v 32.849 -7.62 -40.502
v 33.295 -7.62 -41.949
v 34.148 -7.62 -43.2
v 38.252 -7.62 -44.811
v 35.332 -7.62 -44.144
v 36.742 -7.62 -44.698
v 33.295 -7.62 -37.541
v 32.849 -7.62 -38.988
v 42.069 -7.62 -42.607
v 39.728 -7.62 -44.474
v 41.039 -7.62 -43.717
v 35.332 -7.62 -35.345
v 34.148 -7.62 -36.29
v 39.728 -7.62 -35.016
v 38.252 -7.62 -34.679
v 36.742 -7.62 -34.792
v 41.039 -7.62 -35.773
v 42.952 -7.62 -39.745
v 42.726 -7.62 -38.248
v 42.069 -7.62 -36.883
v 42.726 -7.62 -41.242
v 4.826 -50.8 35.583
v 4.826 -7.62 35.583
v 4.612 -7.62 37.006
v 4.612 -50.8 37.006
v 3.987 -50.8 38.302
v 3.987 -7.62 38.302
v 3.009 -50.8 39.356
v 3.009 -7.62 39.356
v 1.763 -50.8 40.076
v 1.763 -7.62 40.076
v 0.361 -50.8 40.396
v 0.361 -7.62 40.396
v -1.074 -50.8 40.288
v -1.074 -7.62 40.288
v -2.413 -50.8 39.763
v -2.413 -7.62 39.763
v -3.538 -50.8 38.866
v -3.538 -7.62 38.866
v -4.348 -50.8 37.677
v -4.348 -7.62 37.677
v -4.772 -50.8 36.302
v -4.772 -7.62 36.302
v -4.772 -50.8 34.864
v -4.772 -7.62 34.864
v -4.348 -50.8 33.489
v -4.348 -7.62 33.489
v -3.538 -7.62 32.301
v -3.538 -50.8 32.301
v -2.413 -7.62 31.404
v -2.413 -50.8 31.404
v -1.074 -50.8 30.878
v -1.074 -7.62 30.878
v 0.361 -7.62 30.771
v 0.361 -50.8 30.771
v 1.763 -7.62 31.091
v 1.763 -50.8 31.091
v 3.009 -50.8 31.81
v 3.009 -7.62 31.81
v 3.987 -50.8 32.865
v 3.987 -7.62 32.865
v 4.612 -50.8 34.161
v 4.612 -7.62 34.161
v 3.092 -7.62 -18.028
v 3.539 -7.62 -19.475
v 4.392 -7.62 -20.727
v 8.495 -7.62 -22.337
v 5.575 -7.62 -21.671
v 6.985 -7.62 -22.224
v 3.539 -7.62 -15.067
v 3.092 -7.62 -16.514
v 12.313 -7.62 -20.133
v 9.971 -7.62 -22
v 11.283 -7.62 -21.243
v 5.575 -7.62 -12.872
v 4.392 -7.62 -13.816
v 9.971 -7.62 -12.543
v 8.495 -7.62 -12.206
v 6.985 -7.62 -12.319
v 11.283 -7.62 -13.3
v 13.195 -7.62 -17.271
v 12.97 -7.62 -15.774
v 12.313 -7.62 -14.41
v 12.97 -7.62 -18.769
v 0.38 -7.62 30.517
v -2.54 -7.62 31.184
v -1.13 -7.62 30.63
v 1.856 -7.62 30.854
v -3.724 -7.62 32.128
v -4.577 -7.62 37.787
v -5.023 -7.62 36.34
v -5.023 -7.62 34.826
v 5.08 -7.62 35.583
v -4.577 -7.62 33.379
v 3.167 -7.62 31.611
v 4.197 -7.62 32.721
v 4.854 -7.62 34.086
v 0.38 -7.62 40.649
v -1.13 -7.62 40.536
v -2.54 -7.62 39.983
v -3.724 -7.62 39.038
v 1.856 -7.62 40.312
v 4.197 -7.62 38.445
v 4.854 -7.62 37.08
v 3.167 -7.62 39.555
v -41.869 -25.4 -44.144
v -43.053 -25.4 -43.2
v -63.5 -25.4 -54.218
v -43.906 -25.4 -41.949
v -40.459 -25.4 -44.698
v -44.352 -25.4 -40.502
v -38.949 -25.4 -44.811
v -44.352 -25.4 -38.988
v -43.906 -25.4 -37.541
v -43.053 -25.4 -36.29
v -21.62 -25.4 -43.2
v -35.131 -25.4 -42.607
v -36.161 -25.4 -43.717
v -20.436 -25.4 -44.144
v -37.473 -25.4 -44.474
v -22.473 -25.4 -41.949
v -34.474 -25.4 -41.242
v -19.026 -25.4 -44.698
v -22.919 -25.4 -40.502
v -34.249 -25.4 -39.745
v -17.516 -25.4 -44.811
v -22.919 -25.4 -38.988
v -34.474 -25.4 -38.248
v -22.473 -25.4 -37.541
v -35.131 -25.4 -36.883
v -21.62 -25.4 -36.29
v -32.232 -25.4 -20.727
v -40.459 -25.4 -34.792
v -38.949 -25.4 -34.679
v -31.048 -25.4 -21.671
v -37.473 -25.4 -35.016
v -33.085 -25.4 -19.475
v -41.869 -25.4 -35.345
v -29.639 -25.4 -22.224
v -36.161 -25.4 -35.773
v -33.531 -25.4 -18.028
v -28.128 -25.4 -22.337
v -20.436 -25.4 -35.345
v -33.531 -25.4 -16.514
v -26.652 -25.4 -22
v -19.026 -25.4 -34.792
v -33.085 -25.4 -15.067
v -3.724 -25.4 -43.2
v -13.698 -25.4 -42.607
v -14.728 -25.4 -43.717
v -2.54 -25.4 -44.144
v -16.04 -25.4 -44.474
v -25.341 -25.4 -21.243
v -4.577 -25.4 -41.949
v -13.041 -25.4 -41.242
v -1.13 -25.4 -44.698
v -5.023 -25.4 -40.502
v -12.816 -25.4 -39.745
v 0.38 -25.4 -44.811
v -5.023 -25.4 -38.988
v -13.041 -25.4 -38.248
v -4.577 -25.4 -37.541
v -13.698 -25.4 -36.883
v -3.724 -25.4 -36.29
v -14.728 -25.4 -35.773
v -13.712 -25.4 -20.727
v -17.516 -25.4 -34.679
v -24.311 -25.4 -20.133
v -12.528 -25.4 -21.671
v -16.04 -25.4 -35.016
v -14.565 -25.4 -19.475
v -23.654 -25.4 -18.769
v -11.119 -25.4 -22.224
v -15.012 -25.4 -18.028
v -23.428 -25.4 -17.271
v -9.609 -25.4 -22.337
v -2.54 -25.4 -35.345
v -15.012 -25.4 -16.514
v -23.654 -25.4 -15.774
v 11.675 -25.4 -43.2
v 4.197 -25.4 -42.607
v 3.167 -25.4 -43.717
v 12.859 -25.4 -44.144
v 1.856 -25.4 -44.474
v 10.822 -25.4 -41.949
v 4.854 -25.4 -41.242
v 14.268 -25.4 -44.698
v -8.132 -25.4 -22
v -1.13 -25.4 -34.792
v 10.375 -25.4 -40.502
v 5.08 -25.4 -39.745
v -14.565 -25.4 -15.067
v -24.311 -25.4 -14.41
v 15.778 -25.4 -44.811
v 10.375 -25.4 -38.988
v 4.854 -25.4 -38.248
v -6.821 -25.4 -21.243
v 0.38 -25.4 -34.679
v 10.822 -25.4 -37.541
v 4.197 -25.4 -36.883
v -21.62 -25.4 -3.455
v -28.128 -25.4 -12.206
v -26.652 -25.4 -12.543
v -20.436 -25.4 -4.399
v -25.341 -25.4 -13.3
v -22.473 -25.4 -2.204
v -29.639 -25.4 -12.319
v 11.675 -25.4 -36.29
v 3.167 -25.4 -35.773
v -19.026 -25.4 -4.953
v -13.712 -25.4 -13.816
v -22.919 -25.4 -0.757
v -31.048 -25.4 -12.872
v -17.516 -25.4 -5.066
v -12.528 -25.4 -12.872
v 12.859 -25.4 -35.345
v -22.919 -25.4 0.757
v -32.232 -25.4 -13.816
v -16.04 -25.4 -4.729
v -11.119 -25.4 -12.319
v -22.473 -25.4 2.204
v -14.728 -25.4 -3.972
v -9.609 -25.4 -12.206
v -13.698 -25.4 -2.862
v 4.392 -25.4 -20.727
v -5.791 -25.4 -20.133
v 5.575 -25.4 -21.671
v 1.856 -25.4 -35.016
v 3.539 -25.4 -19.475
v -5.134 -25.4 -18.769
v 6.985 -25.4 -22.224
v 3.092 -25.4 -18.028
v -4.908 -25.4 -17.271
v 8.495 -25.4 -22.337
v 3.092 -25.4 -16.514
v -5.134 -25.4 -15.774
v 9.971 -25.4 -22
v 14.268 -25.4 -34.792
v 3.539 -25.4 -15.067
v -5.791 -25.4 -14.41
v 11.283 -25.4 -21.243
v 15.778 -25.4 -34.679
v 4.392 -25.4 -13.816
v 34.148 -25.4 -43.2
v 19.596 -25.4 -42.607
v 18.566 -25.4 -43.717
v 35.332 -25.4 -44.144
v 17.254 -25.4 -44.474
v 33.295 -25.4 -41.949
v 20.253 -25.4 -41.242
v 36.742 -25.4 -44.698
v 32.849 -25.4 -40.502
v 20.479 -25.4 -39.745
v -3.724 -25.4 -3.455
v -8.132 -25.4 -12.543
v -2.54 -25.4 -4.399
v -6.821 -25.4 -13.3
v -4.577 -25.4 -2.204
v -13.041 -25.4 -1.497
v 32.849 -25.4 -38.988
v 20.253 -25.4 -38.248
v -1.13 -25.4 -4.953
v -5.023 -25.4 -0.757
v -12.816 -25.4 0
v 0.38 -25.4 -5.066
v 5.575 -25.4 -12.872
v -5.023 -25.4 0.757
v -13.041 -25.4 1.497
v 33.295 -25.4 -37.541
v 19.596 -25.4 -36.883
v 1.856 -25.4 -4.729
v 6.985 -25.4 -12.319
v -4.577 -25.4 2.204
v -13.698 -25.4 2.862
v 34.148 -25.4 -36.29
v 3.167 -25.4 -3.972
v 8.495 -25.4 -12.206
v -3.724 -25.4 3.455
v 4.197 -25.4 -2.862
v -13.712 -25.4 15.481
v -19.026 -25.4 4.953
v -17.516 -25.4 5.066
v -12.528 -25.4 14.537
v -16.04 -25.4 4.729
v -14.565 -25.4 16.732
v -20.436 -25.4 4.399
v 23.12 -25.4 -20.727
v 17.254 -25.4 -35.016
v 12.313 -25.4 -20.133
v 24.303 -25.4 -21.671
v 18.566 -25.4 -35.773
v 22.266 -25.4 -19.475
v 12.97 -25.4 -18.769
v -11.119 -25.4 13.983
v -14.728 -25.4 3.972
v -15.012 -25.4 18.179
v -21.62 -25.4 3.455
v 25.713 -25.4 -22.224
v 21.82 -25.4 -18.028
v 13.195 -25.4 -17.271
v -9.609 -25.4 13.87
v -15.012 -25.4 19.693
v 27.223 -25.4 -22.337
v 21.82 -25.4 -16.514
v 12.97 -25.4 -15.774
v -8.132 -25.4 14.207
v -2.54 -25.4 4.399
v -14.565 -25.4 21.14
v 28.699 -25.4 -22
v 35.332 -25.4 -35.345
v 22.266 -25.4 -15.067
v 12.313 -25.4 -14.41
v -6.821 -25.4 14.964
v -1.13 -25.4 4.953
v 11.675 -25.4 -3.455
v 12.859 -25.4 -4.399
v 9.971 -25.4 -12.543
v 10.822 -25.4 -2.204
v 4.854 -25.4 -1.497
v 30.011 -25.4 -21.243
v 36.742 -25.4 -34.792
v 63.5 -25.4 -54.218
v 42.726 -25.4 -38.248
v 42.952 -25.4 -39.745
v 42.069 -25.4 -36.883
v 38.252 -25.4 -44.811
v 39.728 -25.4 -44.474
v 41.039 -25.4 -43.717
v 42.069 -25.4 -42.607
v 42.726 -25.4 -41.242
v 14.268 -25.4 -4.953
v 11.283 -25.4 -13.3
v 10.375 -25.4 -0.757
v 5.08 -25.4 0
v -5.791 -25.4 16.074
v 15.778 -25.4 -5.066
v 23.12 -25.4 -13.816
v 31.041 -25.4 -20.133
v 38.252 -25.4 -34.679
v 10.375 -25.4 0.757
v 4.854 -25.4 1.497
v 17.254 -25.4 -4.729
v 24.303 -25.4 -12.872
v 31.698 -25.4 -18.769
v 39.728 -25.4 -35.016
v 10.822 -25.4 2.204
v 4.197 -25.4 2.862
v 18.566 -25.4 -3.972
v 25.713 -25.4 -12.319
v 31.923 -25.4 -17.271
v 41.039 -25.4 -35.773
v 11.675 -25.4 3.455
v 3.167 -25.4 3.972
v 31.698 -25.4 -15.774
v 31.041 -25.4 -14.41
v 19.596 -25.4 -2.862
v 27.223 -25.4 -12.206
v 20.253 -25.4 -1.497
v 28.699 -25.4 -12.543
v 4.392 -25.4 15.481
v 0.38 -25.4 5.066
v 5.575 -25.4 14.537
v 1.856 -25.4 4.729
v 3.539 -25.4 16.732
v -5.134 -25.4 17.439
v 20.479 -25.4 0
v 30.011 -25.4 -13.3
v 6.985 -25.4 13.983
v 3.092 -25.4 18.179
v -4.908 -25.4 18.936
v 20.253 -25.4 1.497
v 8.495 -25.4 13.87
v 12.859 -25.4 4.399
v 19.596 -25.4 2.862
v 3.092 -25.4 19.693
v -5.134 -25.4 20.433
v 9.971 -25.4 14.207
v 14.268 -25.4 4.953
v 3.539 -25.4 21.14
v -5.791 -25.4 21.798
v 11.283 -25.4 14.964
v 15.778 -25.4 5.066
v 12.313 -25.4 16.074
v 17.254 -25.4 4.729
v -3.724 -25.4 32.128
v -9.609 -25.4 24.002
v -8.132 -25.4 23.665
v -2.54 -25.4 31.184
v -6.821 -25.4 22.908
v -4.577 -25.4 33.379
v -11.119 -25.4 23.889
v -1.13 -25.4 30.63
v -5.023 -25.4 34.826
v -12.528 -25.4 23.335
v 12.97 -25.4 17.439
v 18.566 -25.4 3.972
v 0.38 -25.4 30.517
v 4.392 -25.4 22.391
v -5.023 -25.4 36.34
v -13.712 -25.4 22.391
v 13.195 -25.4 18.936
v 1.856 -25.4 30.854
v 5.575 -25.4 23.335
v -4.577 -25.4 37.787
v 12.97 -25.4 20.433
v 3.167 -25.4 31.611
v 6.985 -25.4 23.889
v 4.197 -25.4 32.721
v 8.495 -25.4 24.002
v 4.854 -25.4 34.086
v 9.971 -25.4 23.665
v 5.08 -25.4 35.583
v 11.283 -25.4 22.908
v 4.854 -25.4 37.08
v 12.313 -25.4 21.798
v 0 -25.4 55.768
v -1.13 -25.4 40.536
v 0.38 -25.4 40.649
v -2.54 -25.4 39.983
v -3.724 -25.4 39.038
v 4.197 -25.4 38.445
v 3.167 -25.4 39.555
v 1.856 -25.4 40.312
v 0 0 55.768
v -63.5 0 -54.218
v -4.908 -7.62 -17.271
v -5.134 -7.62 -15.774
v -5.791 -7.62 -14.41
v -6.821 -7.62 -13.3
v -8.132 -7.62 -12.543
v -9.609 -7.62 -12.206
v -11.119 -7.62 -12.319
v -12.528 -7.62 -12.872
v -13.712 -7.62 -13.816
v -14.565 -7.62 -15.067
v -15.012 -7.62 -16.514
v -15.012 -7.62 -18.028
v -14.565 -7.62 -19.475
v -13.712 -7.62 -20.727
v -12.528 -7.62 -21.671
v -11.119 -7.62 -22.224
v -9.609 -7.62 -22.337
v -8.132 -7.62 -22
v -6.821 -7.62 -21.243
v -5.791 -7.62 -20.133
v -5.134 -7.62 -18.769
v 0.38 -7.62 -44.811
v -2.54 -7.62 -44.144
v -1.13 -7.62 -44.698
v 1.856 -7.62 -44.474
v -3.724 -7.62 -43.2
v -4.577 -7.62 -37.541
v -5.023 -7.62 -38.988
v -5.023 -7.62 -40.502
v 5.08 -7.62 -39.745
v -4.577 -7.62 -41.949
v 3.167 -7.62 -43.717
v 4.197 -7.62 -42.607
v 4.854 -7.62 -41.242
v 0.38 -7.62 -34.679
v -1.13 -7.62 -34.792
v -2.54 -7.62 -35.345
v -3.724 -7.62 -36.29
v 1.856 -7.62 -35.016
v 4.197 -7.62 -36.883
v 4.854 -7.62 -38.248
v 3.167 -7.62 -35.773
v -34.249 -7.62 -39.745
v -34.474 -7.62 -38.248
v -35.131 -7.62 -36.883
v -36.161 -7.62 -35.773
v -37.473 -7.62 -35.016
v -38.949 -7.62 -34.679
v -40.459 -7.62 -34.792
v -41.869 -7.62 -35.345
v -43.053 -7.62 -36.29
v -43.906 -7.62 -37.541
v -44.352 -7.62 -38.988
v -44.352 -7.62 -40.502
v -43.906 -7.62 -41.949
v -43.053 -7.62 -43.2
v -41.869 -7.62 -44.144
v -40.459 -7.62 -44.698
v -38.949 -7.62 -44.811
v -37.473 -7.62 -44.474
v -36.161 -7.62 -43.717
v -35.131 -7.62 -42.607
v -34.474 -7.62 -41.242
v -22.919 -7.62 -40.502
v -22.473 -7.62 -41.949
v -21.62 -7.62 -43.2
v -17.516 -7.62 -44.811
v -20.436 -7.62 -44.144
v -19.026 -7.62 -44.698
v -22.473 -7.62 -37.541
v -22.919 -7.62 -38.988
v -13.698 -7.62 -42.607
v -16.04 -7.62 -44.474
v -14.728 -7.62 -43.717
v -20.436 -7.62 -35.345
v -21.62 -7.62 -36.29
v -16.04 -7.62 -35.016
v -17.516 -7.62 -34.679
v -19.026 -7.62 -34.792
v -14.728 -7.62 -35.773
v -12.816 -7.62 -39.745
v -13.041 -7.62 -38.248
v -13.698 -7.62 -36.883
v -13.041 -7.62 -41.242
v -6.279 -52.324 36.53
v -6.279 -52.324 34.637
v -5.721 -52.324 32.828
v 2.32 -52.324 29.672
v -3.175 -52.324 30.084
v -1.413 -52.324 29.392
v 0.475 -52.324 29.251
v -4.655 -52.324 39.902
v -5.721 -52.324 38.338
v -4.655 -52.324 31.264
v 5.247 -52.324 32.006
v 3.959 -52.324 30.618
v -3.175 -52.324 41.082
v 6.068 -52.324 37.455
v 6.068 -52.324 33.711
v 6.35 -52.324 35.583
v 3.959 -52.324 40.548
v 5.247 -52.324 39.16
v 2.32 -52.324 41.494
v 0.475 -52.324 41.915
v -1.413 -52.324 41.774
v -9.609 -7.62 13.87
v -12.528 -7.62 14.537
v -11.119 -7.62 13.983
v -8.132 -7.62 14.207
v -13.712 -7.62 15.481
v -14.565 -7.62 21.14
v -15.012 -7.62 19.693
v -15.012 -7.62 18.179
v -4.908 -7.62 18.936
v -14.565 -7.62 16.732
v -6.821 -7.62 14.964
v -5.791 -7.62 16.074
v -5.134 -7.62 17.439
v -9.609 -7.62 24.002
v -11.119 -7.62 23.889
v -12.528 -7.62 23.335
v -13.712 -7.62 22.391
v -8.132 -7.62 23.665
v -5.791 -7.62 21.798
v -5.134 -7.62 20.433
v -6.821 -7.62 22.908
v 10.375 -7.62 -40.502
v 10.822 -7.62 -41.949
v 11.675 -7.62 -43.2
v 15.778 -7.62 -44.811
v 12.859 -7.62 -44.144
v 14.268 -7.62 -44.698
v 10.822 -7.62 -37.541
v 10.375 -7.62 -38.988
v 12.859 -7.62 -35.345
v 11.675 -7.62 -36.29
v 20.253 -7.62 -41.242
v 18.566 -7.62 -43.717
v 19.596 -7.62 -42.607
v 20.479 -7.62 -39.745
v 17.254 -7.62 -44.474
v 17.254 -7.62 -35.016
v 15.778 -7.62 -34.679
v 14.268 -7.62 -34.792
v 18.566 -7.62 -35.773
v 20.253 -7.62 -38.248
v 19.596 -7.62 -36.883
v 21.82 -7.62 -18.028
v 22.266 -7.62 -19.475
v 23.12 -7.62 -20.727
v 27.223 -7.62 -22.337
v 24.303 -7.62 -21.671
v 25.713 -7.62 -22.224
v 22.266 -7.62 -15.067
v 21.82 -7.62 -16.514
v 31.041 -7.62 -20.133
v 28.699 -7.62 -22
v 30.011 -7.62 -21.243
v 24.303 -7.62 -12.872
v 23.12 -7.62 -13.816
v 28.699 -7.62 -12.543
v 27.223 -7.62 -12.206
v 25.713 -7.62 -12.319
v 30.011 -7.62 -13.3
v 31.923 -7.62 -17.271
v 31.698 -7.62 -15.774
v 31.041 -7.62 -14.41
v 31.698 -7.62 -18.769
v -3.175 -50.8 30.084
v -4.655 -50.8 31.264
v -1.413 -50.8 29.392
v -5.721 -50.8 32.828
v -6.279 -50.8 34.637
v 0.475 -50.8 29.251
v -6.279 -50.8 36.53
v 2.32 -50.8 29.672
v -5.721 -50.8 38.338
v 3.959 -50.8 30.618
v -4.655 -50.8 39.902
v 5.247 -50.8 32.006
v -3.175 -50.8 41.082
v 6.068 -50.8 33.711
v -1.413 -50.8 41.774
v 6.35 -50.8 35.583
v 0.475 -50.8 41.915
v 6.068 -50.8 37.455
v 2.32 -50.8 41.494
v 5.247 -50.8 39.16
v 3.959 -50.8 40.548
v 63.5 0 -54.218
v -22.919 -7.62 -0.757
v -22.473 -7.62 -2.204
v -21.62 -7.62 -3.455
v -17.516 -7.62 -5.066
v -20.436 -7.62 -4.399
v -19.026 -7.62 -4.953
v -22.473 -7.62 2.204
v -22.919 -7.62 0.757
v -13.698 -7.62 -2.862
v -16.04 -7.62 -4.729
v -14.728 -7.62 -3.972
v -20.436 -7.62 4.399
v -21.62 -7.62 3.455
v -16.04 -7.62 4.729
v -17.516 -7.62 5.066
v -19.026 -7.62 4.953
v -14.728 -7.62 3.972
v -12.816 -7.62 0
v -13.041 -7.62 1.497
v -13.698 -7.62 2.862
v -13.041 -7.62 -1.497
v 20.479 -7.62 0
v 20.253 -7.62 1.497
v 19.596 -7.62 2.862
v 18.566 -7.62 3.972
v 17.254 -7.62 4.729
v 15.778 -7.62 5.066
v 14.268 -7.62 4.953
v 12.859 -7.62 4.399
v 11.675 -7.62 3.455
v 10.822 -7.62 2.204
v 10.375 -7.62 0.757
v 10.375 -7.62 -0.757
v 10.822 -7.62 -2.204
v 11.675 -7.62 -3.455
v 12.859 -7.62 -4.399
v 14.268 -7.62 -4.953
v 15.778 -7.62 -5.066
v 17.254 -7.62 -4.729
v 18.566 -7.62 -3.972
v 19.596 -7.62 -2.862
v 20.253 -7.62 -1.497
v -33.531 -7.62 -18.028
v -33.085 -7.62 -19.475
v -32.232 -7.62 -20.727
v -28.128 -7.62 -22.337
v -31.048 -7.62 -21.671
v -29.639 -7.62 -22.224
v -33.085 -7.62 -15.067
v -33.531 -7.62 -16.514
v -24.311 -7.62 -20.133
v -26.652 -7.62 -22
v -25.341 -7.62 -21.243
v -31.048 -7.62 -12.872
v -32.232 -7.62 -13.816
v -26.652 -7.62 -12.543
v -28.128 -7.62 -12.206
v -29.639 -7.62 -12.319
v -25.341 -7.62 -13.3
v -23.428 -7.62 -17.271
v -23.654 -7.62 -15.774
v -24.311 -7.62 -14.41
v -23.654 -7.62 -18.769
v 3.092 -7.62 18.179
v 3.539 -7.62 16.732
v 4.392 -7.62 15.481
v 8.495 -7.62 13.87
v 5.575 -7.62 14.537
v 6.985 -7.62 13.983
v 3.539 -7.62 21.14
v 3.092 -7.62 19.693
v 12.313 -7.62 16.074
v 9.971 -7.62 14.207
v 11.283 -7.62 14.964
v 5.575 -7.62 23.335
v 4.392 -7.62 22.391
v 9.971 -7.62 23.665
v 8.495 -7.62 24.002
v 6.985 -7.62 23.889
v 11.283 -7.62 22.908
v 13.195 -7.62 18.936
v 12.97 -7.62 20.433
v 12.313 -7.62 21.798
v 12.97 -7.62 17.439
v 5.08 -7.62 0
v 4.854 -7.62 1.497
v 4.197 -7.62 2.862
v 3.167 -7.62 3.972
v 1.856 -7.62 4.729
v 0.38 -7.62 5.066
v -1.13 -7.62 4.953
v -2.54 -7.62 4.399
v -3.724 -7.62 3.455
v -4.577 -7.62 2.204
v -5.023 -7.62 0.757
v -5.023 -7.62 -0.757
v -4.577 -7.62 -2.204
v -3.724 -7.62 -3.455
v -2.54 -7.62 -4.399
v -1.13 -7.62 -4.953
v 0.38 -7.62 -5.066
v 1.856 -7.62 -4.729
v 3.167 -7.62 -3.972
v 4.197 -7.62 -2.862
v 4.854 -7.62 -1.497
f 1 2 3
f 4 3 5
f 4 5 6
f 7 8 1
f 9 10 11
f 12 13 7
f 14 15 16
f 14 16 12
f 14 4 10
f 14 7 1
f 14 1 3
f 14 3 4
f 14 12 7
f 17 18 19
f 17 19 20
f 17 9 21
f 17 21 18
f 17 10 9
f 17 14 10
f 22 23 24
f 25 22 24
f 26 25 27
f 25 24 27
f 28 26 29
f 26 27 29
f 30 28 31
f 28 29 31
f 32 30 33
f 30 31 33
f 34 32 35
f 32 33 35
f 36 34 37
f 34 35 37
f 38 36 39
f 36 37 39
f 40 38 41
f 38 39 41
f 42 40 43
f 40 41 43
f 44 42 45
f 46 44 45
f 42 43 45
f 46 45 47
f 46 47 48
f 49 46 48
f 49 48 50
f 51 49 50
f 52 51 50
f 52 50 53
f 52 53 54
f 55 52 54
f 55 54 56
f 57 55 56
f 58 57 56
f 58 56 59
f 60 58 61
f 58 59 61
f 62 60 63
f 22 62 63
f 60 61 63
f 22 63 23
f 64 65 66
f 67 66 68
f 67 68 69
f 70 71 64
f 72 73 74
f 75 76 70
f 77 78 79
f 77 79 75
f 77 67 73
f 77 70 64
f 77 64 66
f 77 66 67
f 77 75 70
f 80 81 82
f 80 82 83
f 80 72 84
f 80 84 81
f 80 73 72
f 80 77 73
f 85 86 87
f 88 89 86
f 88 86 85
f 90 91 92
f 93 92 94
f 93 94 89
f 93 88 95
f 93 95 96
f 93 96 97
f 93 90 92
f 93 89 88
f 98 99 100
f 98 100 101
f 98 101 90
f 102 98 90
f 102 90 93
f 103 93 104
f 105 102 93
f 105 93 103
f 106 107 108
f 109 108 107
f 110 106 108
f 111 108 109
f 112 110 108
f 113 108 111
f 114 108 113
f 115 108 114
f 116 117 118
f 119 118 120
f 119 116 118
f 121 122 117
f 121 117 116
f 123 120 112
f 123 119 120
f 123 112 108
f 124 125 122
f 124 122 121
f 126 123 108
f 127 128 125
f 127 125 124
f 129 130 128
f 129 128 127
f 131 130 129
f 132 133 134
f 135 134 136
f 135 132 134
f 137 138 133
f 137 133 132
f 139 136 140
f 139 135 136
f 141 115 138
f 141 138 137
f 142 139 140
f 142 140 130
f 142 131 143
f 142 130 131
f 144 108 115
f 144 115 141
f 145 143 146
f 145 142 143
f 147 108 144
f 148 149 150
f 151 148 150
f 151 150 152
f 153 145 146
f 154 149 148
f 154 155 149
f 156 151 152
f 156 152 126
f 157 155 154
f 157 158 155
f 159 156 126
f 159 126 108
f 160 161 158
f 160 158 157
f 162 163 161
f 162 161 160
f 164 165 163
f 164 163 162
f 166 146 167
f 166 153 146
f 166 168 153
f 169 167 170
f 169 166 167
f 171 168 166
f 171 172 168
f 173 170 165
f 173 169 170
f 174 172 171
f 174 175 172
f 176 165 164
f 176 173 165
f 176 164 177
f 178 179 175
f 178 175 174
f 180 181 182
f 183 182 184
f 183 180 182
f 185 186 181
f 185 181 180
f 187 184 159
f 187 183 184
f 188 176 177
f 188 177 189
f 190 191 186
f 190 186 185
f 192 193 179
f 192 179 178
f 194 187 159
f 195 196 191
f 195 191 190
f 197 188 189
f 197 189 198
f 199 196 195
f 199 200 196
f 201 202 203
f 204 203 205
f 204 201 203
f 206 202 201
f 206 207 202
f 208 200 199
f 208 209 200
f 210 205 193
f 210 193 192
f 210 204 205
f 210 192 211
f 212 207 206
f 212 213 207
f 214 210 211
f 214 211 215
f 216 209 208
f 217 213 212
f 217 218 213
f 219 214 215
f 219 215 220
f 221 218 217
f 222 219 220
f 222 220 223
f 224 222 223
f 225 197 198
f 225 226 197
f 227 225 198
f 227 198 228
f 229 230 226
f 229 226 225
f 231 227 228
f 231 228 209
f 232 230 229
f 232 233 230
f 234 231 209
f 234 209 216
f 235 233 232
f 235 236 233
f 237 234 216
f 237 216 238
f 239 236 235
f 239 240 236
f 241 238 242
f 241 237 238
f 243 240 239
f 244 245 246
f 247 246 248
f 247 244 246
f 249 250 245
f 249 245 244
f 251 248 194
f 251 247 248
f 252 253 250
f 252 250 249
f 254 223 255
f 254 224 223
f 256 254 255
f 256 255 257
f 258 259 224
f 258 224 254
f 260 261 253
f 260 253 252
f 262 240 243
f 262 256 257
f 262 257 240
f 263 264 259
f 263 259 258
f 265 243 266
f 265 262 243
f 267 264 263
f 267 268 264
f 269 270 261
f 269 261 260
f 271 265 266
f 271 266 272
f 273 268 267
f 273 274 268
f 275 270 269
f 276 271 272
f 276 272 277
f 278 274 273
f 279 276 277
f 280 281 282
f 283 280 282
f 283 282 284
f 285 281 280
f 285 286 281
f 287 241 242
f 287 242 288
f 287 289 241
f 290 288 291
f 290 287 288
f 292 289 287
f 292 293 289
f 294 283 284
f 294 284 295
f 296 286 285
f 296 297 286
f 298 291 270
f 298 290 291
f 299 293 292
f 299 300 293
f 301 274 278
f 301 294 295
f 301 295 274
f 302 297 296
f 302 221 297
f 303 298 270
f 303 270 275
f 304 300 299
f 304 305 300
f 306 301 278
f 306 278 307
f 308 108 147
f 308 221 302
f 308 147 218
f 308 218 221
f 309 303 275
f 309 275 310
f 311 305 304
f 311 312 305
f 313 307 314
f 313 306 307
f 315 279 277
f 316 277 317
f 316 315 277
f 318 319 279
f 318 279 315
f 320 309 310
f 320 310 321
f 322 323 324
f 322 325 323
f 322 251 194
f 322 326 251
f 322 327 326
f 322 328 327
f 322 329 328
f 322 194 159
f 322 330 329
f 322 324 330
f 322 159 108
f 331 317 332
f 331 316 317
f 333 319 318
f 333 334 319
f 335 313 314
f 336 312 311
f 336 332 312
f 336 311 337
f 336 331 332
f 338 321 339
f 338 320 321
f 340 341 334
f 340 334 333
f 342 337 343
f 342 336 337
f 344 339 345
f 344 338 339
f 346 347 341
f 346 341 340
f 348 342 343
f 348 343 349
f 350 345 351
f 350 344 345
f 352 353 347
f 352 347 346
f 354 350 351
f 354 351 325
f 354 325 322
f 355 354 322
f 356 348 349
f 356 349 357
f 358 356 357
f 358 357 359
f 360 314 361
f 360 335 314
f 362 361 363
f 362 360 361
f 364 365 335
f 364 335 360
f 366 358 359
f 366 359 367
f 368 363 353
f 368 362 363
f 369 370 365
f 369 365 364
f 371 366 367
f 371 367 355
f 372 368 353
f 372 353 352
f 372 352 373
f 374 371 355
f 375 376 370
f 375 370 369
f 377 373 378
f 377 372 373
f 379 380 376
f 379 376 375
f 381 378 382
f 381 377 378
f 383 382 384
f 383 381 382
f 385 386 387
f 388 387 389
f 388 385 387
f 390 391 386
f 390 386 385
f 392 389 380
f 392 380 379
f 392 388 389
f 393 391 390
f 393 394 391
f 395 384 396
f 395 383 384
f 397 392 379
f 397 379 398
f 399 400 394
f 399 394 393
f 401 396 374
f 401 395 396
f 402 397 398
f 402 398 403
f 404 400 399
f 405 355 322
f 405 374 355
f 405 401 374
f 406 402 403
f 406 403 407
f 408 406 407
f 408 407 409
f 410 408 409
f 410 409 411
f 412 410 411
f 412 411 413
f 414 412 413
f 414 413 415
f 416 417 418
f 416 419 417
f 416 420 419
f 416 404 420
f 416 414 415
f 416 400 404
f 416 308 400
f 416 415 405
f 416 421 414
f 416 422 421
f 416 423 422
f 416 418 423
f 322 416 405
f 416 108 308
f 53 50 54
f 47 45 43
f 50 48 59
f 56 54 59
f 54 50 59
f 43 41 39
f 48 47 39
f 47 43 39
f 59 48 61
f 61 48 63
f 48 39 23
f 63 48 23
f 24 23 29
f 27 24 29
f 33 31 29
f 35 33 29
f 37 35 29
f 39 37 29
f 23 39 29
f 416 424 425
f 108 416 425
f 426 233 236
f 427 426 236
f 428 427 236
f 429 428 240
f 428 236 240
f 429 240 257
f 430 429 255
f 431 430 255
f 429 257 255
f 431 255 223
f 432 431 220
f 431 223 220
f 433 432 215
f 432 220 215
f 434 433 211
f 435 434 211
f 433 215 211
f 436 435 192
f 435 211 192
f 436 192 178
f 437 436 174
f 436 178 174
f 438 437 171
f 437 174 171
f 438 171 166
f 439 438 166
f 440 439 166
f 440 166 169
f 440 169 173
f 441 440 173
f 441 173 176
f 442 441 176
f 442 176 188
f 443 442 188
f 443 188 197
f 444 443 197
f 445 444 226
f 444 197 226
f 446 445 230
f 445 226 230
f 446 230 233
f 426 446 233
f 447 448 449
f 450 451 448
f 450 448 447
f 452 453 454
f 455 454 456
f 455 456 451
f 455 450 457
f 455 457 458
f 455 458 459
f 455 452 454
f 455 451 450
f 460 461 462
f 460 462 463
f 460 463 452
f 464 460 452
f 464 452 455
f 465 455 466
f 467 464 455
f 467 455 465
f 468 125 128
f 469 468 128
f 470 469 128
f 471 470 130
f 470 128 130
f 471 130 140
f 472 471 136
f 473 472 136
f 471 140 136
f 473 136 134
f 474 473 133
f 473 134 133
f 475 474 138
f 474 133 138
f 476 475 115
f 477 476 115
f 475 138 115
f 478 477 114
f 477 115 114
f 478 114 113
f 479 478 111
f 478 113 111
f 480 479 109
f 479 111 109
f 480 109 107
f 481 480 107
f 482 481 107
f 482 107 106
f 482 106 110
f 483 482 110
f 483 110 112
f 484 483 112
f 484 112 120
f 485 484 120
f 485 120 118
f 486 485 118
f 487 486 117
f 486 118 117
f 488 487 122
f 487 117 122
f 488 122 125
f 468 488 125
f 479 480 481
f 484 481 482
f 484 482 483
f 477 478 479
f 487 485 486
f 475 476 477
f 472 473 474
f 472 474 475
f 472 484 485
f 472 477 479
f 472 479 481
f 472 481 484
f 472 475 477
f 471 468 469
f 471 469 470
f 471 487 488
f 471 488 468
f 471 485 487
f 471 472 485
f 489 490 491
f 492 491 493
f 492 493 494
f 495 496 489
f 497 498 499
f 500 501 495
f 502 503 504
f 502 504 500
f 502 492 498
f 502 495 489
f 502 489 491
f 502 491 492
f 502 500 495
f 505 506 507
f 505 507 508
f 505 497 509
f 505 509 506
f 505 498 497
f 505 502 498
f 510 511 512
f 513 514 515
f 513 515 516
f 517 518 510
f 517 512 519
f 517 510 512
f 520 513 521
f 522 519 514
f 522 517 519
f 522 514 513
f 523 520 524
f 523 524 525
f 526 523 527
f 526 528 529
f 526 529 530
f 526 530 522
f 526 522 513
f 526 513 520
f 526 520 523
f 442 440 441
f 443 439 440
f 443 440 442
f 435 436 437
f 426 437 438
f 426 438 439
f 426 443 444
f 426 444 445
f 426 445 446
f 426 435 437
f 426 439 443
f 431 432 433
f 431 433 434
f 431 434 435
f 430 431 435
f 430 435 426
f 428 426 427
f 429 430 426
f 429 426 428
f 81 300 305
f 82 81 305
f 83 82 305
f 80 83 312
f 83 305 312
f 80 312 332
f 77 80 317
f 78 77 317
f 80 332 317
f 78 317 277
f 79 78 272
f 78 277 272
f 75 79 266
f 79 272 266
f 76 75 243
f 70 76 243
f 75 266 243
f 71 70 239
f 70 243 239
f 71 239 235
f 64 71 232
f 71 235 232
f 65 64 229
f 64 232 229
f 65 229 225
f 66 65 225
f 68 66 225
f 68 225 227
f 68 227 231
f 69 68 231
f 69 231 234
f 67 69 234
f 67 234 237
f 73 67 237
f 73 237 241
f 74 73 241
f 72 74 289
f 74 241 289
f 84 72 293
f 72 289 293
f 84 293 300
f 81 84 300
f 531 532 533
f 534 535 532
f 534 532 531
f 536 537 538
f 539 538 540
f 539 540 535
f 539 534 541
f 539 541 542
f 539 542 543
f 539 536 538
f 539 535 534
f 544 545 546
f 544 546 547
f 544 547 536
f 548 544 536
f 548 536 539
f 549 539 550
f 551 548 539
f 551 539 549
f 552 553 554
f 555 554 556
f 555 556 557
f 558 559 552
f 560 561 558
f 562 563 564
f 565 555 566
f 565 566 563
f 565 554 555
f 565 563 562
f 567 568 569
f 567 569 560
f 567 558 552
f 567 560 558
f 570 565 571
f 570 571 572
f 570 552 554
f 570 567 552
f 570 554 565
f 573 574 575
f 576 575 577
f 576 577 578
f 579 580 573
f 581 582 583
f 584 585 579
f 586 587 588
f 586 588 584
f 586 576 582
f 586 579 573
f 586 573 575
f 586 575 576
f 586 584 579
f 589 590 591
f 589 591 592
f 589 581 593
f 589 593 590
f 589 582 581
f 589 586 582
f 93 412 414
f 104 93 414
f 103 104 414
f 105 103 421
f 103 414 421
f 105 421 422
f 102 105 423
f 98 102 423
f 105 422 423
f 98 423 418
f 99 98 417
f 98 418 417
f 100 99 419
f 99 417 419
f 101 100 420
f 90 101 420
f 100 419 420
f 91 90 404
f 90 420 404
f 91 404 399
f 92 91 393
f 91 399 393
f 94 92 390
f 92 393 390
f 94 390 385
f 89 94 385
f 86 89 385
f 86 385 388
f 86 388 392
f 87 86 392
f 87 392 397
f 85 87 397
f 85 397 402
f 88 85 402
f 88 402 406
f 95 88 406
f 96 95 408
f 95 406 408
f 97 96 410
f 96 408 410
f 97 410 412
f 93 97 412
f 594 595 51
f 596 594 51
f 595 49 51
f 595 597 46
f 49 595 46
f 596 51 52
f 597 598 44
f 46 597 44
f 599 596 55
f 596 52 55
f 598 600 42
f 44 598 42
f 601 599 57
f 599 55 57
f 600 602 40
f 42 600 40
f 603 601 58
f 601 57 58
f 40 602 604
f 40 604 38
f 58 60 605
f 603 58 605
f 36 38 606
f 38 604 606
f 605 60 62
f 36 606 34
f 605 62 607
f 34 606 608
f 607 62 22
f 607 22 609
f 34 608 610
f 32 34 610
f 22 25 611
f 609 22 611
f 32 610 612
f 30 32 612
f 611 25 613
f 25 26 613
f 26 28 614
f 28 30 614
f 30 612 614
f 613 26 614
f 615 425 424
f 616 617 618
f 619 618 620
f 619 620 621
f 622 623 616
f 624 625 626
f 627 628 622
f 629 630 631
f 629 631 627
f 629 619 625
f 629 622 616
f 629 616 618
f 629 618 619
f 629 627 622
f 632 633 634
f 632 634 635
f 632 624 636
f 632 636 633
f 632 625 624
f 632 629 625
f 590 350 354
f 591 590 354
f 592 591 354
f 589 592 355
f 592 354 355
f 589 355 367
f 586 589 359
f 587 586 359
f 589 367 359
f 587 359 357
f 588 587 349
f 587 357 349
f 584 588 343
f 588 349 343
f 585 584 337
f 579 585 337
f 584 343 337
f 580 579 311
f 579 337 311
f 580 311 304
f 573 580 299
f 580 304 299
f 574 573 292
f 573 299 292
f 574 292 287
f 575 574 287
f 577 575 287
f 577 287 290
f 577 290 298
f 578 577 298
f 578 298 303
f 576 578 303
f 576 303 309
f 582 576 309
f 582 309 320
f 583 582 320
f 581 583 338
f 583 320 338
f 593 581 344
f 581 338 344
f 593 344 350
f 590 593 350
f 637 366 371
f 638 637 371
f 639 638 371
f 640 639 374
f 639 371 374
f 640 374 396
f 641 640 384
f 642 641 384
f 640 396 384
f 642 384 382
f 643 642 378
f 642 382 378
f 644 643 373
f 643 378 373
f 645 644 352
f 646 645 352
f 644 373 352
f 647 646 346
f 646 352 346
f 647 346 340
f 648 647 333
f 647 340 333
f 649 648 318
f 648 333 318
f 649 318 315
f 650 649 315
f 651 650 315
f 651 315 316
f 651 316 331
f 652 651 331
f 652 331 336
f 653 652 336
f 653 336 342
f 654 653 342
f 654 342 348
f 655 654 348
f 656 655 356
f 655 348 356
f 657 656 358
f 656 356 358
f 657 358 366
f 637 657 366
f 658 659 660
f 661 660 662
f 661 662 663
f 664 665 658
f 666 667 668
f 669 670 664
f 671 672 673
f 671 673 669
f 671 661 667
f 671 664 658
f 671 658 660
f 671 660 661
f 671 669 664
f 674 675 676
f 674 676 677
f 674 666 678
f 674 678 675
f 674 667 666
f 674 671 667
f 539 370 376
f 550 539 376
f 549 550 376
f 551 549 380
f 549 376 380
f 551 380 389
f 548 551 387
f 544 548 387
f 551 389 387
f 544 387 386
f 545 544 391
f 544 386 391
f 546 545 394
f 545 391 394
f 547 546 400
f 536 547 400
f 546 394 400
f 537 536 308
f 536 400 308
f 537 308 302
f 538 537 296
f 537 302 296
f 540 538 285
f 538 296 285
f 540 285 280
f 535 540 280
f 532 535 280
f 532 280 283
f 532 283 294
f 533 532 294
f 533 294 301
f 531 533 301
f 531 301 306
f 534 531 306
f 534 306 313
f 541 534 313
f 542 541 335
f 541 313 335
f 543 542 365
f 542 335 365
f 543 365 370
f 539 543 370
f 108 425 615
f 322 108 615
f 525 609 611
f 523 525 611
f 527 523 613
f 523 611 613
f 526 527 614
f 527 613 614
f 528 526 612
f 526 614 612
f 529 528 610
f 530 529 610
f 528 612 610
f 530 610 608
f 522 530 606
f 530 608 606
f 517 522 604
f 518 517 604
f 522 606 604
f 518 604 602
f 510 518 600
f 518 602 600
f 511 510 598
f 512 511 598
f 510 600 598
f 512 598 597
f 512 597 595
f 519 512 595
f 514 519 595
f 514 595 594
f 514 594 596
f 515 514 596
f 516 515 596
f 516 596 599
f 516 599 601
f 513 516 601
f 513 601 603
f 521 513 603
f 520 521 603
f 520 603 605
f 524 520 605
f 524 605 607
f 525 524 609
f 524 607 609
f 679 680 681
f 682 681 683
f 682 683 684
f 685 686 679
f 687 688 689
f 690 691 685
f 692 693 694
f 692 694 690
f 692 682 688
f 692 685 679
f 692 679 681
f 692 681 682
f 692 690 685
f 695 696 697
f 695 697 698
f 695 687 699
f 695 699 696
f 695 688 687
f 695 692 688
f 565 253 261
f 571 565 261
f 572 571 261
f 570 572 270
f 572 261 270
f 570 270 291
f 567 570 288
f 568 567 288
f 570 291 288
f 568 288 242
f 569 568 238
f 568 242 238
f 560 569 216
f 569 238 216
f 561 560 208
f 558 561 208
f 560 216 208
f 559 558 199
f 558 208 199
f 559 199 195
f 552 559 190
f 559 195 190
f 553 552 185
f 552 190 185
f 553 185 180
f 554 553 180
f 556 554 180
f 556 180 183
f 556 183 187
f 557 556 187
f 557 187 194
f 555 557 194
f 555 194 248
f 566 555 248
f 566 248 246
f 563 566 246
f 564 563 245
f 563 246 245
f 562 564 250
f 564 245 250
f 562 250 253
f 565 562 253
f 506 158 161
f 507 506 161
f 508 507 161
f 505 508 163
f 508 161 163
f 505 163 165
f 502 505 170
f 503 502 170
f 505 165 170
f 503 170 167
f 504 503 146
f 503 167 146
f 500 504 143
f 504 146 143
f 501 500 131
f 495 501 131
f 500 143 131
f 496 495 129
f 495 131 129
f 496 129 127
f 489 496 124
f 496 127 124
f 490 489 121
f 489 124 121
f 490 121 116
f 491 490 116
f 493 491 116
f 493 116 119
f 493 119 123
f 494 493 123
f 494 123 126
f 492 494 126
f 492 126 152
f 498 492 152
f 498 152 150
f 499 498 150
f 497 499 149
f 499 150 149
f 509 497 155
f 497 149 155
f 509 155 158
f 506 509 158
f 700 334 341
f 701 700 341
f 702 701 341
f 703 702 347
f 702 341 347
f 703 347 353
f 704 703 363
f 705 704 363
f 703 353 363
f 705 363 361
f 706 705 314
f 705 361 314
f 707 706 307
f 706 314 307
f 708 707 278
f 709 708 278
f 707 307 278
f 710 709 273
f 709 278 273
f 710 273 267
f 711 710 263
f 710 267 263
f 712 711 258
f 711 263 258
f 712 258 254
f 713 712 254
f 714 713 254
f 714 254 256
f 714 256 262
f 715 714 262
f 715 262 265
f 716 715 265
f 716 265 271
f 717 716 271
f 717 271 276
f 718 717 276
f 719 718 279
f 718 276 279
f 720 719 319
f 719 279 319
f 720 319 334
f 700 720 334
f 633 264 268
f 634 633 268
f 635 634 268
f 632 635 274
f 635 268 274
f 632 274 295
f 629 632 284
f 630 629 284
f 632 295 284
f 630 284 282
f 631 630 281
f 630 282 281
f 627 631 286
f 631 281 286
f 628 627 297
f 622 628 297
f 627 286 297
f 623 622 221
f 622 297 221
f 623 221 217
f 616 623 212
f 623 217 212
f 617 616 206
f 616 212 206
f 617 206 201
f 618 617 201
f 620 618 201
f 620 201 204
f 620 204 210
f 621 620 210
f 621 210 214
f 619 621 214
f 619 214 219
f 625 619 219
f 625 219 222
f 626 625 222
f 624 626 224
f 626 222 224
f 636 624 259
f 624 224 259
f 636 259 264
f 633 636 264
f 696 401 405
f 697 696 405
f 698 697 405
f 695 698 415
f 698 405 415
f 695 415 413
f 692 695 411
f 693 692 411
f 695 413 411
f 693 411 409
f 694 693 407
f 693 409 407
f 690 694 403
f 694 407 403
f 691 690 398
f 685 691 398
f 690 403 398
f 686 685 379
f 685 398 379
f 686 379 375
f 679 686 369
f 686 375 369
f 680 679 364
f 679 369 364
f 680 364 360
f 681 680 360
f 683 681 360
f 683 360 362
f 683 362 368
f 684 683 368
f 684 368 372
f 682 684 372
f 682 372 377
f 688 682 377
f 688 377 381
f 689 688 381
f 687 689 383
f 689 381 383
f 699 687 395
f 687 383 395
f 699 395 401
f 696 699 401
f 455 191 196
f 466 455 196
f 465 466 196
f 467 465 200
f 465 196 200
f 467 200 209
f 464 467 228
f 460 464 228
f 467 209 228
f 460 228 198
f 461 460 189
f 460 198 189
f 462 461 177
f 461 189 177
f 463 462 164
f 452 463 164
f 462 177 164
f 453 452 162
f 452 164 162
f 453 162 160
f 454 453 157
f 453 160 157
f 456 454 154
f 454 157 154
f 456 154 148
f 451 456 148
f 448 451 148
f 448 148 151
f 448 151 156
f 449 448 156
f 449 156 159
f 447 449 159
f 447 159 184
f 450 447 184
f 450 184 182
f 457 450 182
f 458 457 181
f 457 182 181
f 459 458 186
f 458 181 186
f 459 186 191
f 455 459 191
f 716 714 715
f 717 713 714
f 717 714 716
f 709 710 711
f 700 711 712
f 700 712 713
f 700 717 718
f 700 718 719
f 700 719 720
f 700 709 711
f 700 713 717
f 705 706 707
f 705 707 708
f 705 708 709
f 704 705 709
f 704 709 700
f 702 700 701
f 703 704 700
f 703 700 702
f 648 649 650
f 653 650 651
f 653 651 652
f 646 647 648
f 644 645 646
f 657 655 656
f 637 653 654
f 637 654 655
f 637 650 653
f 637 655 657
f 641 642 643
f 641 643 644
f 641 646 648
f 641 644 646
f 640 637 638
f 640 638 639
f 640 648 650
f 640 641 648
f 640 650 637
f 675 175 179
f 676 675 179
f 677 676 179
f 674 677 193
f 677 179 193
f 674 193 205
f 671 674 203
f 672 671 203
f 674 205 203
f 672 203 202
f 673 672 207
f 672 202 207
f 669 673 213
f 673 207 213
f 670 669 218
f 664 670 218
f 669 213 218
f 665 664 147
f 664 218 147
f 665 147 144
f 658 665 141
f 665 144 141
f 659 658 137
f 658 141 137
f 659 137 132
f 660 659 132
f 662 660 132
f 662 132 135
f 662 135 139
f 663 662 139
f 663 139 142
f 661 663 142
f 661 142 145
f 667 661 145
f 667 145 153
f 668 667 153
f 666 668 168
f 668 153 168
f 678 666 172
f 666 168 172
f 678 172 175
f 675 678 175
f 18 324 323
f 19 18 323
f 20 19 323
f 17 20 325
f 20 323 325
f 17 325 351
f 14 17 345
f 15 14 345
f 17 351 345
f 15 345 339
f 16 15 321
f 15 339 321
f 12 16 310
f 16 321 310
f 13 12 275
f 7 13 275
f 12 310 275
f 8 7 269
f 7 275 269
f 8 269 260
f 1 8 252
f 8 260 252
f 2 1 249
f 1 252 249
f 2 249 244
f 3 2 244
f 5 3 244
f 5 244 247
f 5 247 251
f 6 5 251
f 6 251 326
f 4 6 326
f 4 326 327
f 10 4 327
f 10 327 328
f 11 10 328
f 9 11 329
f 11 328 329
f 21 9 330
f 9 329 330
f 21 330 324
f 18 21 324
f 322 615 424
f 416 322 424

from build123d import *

# Parameters (mm, degrees)
F1_DEPTH = 25.4
F2_R     = 5.08
F3_DEPTH = 17.78
F4_R     = 4.826
F5_DEPTH = 43.18
F6_R     = 6.35
F7_DEPTH = 1.524


with BuildPart() as f1:
    # F0 (on Front) → F1 (new body)
    with BuildSketch(Plane.XZ):
        Polygon((63.5, -54.21753), (0, 55.767696), (-63.5, -54.21753), align=None)
    extrude(amount=F1_DEPTH)

    # F2 (on face) → F3 (cut)
    with BuildSketch(Plane.XZ.offset(25.4)):
        with Locations((0, 35.58312)):
            Circle(F2_R)
        with Locations((-9.988246, 18.936047)):
            Circle(F2_R)
        with Locations((8.115448, 18.936047)):
            Circle(F2_R)
        with Locations((-17.895607, 0)):
            Circle(F2_R)
        Circle(F2_R)
        with Locations((15.398542, 0)):
            Circle(F2_R)
        with Locations((-28.508116, -17.27134)):
            Circle(F2_R)
        with Locations((-9.988246, -17.27134)):
            Circle(F2_R)
        with Locations((8.115448, -17.27134)):
            Circle(F2_R)
        with Locations((26.843408, -17.27134)):
            Circle(F2_R)
        with Locations((-39.328713, -39.744888)):
            Circle(F2_R)
        with Locations((-17.895607, -39.744888)):
            Circle(F2_R)
        with Locations((0, -39.744888)):
            Circle(F2_R)
        with Locations((15.398542, -39.744888)):
            Circle(F2_R)
        with Locations((37.872095, -39.744888)):
            Circle(F2_R)
    extrude(amount=-F3_DEPTH, mode=Mode.SUBTRACT)


with BuildPart() as f5:
    # F4 (on face) → F5 (new body)
    with BuildSketch(Plane.XZ.offset(7.62)):
        with Locations((0, 35.58312)):
            Circle(F4_R)
    extrude(amount=F5_DEPTH)

    # F6 (on face) → F7 (join)
    with BuildSketch(Plane.XZ.offset(50.8)):
        with Locations((0, 35.58312)):
            Circle(F6_R)
    extrude(amount=F7_DEPTH)


solid = Compound([f1.part, f5.part])
